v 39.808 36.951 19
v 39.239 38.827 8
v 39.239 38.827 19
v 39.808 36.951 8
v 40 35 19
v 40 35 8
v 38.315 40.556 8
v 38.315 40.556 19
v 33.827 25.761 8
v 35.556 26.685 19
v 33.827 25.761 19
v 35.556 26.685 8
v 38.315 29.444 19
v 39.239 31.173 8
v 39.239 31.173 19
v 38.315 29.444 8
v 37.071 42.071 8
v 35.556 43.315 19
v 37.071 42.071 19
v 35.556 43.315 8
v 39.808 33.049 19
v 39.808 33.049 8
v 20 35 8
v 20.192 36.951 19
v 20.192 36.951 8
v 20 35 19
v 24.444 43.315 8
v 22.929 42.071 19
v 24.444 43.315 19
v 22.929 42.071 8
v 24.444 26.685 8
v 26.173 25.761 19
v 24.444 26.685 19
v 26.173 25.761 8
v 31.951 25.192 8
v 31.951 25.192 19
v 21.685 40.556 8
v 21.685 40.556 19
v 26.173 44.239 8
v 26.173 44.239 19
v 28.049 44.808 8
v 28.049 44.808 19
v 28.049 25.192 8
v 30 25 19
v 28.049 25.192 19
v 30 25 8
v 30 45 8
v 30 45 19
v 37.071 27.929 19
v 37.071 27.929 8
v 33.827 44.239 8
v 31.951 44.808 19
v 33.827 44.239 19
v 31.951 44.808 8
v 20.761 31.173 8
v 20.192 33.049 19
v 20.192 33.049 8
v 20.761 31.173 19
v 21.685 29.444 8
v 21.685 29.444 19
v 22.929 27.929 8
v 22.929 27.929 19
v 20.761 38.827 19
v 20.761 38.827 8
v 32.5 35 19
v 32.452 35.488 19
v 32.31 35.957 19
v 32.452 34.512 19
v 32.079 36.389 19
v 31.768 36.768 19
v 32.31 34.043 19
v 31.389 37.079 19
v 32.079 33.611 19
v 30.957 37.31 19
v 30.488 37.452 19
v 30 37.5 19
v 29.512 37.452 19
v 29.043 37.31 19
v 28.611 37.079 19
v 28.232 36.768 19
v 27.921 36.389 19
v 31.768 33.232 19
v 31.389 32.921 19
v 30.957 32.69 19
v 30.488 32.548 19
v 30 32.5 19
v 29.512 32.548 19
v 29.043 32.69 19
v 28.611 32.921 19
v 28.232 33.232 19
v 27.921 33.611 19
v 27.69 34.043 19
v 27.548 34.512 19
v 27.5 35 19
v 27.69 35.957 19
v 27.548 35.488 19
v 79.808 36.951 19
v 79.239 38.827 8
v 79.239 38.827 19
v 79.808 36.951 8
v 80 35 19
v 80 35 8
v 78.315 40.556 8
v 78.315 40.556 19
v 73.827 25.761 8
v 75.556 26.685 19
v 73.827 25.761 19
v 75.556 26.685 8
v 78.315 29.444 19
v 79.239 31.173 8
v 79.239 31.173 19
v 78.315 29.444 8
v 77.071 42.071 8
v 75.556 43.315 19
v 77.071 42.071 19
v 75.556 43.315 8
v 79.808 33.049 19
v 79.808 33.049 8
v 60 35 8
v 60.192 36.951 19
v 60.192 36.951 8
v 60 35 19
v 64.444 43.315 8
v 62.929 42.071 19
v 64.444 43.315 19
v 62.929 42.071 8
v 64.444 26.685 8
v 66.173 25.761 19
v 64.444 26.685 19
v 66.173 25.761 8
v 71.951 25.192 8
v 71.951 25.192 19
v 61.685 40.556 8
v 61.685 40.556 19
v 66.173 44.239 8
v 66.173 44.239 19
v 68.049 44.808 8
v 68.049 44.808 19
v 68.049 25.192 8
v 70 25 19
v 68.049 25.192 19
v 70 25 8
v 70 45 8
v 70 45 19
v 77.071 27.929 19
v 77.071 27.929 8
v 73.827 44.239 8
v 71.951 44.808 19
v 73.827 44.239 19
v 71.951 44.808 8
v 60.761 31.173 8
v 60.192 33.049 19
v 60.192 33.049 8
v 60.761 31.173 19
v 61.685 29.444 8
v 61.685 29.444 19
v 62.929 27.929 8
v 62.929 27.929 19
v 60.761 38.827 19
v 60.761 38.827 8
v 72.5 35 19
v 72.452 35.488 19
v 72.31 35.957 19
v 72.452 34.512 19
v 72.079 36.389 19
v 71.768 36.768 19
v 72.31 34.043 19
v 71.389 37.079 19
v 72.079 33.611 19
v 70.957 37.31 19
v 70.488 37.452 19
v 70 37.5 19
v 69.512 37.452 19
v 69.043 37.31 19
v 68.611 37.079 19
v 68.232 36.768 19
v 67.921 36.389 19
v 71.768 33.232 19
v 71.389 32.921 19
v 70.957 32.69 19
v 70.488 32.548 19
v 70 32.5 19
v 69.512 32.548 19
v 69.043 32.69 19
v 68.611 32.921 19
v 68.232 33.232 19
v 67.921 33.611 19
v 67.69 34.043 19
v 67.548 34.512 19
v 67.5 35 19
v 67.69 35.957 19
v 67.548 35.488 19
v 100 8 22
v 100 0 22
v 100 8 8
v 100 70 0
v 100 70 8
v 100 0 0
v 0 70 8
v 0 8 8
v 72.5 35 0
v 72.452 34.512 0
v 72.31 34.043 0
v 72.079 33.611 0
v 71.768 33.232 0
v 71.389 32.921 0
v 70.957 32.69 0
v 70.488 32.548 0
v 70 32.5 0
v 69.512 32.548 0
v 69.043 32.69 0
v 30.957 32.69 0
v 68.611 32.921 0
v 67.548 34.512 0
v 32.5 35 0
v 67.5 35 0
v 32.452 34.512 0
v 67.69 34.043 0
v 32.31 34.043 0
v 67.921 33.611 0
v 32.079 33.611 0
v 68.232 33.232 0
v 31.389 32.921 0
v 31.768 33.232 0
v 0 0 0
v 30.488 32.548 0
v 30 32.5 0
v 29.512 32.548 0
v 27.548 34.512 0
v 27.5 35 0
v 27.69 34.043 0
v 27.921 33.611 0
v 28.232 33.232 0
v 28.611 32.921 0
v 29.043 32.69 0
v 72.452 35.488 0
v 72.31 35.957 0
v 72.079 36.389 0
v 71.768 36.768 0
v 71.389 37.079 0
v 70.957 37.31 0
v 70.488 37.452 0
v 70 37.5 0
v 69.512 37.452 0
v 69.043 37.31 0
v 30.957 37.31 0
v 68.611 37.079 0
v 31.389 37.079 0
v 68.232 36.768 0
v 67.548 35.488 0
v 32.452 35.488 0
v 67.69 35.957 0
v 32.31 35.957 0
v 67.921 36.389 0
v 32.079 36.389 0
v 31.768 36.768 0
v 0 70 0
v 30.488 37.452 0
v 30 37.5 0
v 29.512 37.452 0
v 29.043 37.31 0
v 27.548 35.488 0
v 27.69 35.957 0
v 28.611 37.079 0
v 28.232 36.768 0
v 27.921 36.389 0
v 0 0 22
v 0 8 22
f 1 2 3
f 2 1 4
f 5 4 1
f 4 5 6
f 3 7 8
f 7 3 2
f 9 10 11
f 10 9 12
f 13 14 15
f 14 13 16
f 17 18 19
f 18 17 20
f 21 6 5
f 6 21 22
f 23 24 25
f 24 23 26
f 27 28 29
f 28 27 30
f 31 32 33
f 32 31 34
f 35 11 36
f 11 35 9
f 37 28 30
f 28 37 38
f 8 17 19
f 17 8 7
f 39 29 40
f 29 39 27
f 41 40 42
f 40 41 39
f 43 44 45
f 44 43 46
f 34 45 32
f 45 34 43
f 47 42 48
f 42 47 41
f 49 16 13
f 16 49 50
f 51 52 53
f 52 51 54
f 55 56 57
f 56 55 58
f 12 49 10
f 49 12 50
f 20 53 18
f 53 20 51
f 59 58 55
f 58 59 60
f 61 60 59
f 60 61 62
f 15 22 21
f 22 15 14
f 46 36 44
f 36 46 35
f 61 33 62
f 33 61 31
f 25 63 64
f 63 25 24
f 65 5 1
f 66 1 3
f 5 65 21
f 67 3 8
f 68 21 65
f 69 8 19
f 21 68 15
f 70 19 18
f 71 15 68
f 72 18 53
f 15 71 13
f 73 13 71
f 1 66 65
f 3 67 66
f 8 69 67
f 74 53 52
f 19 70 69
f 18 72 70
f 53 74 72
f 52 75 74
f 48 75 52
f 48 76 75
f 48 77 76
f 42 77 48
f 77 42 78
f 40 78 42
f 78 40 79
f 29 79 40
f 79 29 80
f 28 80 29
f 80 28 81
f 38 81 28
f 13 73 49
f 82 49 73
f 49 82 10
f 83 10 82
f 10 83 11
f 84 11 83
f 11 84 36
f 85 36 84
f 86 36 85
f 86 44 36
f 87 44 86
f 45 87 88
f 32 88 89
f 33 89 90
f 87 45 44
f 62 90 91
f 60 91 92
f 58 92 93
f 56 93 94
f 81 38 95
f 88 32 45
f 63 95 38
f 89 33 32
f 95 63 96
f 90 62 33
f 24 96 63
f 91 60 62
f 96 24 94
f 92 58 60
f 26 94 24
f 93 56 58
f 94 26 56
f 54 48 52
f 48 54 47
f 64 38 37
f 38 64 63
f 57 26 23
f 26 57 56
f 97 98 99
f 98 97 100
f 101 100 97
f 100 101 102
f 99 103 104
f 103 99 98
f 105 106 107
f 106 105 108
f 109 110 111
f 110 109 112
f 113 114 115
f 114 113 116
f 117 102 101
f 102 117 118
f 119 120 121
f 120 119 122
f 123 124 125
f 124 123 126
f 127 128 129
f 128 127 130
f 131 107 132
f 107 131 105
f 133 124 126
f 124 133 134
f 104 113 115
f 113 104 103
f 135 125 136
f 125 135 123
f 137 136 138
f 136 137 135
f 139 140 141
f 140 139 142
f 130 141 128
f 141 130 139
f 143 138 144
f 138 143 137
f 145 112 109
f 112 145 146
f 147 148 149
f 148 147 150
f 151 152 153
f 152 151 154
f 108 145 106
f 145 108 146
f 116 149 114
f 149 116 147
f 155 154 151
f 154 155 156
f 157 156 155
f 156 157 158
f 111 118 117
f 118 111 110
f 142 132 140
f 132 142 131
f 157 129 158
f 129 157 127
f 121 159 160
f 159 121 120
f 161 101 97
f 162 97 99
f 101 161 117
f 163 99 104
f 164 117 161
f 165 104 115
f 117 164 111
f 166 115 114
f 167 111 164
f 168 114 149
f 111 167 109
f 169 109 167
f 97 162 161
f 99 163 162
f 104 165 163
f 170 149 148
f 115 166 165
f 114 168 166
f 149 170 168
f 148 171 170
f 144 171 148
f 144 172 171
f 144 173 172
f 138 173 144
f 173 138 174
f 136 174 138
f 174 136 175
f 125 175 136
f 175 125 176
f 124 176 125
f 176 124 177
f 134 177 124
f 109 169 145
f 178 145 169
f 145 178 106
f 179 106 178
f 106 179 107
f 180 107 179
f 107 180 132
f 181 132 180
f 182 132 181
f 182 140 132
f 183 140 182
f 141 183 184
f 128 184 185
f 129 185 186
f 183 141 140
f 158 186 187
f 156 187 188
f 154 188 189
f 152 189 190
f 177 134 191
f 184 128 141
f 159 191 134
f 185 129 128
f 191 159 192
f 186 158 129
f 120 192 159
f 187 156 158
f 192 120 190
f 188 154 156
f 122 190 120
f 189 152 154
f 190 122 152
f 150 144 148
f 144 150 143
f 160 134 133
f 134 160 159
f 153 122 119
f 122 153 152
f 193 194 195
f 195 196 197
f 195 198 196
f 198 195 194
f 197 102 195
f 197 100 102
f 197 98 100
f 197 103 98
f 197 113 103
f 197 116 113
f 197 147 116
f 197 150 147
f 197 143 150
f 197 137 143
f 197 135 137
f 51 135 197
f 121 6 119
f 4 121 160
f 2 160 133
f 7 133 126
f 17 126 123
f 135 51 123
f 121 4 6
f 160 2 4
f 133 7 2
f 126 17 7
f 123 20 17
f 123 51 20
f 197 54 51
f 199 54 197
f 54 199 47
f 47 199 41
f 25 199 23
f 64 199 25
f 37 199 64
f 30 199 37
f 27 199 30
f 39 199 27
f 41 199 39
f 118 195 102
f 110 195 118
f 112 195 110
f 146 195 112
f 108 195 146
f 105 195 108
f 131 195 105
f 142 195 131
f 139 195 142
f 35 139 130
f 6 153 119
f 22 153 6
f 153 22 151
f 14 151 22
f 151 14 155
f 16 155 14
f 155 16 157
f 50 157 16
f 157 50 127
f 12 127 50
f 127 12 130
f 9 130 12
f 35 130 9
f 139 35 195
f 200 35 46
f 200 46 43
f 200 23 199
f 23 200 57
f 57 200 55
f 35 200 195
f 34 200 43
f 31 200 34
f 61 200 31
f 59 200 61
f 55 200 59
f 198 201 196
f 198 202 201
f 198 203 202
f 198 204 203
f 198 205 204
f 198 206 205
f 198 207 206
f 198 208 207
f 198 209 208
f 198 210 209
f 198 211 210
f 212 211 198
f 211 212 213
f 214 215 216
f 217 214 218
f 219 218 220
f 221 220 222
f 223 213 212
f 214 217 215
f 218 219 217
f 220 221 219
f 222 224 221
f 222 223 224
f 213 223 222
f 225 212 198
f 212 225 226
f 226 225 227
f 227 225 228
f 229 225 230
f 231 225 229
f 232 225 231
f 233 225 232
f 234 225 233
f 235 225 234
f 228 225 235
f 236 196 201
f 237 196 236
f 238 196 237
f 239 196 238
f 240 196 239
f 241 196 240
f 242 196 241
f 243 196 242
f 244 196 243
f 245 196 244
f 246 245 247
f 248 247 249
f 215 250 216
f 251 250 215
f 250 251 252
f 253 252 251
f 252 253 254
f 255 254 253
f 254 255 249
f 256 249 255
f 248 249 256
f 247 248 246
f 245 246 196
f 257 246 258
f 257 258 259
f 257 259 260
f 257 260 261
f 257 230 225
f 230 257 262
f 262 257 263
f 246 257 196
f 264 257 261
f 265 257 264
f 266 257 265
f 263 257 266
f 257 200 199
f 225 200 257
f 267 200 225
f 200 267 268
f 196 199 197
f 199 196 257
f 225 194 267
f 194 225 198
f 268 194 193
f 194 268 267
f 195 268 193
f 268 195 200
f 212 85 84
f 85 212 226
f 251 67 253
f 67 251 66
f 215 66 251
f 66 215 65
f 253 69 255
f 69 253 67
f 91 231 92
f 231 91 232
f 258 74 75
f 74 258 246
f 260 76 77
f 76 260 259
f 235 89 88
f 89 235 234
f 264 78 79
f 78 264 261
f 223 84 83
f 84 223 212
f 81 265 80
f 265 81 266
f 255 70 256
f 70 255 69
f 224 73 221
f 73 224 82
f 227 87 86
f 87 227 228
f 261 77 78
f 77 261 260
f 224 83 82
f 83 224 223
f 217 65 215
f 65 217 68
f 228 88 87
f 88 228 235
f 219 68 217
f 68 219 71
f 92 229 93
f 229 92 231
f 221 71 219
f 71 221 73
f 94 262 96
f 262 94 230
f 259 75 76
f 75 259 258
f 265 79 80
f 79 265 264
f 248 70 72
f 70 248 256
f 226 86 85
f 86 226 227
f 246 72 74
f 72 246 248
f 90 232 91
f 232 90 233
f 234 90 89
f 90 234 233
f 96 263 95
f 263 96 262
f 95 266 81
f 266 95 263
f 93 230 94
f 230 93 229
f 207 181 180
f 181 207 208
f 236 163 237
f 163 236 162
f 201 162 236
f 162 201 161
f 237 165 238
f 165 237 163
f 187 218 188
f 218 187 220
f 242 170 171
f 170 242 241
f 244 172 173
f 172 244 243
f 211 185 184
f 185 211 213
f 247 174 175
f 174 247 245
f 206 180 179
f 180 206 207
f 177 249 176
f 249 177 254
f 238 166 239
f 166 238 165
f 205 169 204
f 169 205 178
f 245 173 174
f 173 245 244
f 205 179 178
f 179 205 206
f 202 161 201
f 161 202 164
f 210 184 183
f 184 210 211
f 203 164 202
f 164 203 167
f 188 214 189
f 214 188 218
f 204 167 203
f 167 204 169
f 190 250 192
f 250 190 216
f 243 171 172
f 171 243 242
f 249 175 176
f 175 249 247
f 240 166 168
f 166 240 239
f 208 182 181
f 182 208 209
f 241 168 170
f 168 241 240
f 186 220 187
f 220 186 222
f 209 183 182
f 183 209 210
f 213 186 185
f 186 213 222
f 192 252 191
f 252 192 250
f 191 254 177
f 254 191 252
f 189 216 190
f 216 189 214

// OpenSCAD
$fn = 32;

// ----------------------------------------------------------------------
// Drill jig: fence jig
// ----------------------------------------------------------------------

// --- parameters (mm) ---
plate_l = 100;            // plate length, X
plate_w = 70;             // plate width, Y
plate_t = 8;              // plate thickness
boss_d = 20;              // guide boss diameter
boss_h = 12;              // boss height above the plate
guide_d = 5;              // guide hole diameter
boss_pitch = 40;          // boss pitch
fence_h = 15;             // fence height above the plate
fence_t = 8;              // fence thickness

n_boss = 2;  // guide bosses
boss_x0 = (plate_l - (n_boss - 1) * boss_pitch) / 2;  // first boss X
boss_top = plate_t - 1 + boss_h;  // boss crown height
fence_top = plate_t - 1 + fence_h;  // fence crown height
total_h = max([fence_top, boss_top]);  // overall height

difference() {
  union() {
  cube([plate_l, plate_w, plate_t]);
  for (i = [0 : n_boss - 1])
    translate([boss_x0 + i * boss_pitch, plate_w / 2, plate_t - 1])
      cylinder(h = boss_h, d = boss_d);
  translate([0, 0, plate_t - 1]) cube([plate_l, fence_t, fence_h]);
  }
  for (i = [0 : n_boss - 1])
    translate([boss_x0 + i * boss_pitch, plate_w / 2, -1])
      cylinder(h = plate_t + boss_h, d = guide_d);
}
